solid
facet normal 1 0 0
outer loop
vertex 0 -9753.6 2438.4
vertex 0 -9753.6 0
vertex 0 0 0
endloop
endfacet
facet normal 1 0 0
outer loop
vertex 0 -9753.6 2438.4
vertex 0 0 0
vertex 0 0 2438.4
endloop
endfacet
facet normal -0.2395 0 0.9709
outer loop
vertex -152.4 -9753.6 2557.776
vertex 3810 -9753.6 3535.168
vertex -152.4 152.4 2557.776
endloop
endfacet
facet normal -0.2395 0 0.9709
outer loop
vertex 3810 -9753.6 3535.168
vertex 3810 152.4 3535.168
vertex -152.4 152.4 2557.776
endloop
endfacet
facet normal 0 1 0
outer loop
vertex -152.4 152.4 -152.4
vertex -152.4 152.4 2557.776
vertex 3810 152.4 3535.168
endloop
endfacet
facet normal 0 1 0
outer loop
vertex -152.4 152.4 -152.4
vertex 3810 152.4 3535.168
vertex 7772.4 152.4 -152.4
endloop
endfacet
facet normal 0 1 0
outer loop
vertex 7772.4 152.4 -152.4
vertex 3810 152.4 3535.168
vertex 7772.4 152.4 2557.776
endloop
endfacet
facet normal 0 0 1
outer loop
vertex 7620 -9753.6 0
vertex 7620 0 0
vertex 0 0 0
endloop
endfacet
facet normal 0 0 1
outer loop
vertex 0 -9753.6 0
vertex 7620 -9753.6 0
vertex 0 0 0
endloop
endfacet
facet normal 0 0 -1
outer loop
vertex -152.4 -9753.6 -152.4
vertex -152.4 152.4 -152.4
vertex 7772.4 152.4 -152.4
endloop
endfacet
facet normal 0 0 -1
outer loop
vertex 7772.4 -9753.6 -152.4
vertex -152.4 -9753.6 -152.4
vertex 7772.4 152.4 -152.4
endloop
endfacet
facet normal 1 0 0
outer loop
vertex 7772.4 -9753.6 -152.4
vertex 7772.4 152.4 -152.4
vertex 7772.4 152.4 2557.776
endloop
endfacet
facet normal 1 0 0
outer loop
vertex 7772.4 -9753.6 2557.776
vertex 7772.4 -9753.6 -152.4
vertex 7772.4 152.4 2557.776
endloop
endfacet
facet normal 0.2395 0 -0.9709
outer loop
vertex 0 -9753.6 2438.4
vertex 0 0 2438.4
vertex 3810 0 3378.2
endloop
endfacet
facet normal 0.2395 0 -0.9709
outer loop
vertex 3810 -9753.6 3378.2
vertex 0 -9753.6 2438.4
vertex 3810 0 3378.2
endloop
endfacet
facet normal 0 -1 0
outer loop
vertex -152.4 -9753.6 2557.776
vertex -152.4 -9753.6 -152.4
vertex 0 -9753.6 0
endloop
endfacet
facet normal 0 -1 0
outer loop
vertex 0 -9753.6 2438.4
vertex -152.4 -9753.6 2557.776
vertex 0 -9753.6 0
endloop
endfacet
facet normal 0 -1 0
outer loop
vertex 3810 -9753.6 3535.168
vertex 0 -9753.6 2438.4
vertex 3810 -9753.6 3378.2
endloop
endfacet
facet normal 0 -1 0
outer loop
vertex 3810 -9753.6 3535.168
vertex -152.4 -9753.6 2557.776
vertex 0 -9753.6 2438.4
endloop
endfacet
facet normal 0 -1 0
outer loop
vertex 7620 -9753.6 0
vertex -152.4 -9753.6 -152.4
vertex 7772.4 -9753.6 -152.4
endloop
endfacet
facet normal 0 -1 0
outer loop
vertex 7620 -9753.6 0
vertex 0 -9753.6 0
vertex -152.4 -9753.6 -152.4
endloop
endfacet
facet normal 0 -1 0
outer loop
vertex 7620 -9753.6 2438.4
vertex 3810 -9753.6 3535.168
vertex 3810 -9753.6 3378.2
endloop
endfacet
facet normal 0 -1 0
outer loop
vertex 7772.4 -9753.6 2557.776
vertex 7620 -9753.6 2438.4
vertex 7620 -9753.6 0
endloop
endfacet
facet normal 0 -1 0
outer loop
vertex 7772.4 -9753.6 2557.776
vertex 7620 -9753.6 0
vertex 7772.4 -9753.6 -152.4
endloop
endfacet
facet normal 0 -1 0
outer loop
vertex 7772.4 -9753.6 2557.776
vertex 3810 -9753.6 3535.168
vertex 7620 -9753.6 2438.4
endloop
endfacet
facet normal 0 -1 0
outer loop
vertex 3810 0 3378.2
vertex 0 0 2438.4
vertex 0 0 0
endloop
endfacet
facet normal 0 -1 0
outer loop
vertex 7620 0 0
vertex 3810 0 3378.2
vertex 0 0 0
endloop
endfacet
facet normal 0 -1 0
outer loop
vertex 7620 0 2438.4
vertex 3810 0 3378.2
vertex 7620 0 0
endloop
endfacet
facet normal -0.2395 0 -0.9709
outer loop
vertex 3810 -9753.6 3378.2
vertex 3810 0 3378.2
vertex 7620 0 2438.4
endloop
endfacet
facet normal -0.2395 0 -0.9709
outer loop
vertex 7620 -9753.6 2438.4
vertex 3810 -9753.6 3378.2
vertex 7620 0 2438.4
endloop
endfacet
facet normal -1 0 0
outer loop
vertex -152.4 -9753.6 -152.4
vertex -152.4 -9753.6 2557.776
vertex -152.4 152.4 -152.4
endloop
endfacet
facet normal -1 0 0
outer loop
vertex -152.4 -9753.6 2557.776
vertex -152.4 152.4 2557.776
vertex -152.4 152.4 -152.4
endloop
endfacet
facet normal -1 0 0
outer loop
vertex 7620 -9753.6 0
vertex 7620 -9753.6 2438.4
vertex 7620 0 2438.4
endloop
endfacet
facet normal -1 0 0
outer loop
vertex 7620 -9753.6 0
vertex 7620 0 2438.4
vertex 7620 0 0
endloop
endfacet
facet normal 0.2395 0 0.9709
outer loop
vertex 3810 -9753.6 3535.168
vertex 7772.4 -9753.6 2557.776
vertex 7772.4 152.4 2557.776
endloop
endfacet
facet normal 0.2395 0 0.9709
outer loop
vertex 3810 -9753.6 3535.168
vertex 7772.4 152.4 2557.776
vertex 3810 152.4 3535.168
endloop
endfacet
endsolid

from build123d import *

# Parameters (mm, degrees)
F1_DEPTH = 152.4
F2_DEPTH = 9753.6


with BuildPart() as f1:
    # F0 (on Front) → F1 (new body)
    with BuildSketch(Plane.XZ):
        Polygon((7772.4, 2557.77589), (3810, 3535.16789), (-152.4, 2557.77589), (-152.4, -152.4), (7772.4, -152.4), align=None)
        Polygon((7620, 0), (0, 0), (0, 2438.4), (3810, 3378.2), (7620, 2438.4), align=None, mode=Mode.SUBTRACT)
        Polygon((0, 2438.4), (0, 0), (7620, 0), (7620, 2438.4), (3810, 3378.2), align=None)
    extrude(amount=-F1_DEPTH)

    # F0 (on Front) → F2 (join)
    with BuildSketch(Plane.XZ):
        Polygon((7772.4, 2557.77589), (3810, 3535.16789), (-152.4, 2557.77589), (-152.4, -152.4), (7772.4, -152.4), align=None)
        Polygon((7620, 0), (0, 0), (0, 2438.4), (3810, 3378.2), (7620, 2438.4), align=None, mode=Mode.SUBTRACT)
    extrude(amount=F2_DEPTH)


solid = f1.part
